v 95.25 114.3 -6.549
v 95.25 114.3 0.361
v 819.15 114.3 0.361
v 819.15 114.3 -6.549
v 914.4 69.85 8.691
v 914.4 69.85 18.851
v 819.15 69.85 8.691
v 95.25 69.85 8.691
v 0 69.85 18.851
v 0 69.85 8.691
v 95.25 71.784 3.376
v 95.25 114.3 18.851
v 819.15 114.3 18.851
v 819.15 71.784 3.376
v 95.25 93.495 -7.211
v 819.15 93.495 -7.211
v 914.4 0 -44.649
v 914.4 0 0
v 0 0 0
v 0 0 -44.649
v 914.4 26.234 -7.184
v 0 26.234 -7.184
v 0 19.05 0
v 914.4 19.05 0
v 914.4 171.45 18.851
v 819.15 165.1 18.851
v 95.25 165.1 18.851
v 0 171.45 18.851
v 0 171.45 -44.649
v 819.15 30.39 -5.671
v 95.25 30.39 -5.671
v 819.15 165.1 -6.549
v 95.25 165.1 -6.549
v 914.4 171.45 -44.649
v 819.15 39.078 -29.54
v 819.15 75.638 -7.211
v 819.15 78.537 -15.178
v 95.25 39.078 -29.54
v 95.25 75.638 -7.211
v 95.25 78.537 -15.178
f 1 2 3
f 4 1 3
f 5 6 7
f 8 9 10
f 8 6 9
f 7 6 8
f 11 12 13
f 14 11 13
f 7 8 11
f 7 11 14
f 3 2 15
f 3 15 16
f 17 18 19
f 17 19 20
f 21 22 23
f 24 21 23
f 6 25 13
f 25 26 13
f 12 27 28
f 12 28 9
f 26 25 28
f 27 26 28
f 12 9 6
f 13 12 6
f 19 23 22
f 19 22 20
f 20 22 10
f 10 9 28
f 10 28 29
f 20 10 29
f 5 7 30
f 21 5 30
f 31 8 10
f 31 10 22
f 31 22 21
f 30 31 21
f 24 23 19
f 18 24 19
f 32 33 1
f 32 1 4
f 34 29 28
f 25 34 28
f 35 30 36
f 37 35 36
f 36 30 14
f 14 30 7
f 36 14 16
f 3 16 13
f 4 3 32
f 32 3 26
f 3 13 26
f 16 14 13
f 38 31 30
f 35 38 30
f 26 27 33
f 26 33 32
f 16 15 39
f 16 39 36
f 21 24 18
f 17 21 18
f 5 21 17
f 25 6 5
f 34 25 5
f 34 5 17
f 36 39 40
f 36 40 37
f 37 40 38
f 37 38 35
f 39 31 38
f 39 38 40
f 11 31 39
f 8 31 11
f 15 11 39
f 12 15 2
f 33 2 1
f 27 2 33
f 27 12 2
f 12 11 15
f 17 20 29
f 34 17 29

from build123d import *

# Parameters (mm, degrees)
BOSS_EXTRUDE1_DEPTH = 914.4
SKETCH2_W           = 723.9
SKETCH2_H           = 50.8
CUT_EXTRUDE1_DEPTH  = 76.2
SKETCH2_2_W         = 723.9
SKETCH2_2_H         = 50.8
CUT_EXTRUDE2_DEPTH  = 25.4
SKETCH3_W           = 723.9
SKETCH3_H           = 41.992084525
CUT_EXTRUDE3_DEPTH  = 25.4


with BuildPart() as part:
    # Sketch1 → Boss-Extrude1 (new body)
    with BuildSketch(Plane(origin=(0, 0, 0), x_dir=(0, 0, -1), z_dir=(1, 0, 0))):
        Polygon((0, 0), (44.649353735, 0), (44.649353735, 171.45), (-18.850646265, 171.45), (-18.850646265, 69.85), (-8.690646265, 69.85), (7.184204897, 26.234204897), (0, 19.05), align=None)
    extrude(amount=BOSS_EXTRUDE1_DEPTH)

    # Sketch2 → Cut-Extrude1 (cut, along a direction that is not the sketch's normal)
    with BuildSketch(Plane.XY.offset(18.850646265)):
        with Locations((457.2, 139.7)):
            Rectangle(SKETCH2_W, SKETCH2_H)
    extrude(amount=-CUT_EXTRUDE1_DEPTH, dir=(0, 0.9396926207859081, 0.34202014332566966), mode=Mode.SUBTRACT)

    # Sketch2<2> → Cut-Extrude2 (cut)
    with BuildSketch(Plane.XY.offset(18.850646265)):
        with Locations((457.2, 139.7)):
            Rectangle(SKETCH2_2_W, SKETCH2_2_H)
    extrude(amount=-CUT_EXTRUDE2_DEPTH, mode=Mode.SUBTRACT)

    # Sketch3 → Cut-Extrude3 (cut)
    with BuildSketch(Plane(origin=(0, 5.377777955, -14.775323497), x_dir=(1, 0, 0), z_dir=(0, -0.34202014332566977, 0.9396926207859081))):
        with Locations((457.2, 47.613863381)):
            Rectangle(SKETCH3_W, SKETCH3_H)
    extrude(amount=-CUT_EXTRUDE3_DEPTH, mode=Mode.SUBTRACT)


solid = part.part
